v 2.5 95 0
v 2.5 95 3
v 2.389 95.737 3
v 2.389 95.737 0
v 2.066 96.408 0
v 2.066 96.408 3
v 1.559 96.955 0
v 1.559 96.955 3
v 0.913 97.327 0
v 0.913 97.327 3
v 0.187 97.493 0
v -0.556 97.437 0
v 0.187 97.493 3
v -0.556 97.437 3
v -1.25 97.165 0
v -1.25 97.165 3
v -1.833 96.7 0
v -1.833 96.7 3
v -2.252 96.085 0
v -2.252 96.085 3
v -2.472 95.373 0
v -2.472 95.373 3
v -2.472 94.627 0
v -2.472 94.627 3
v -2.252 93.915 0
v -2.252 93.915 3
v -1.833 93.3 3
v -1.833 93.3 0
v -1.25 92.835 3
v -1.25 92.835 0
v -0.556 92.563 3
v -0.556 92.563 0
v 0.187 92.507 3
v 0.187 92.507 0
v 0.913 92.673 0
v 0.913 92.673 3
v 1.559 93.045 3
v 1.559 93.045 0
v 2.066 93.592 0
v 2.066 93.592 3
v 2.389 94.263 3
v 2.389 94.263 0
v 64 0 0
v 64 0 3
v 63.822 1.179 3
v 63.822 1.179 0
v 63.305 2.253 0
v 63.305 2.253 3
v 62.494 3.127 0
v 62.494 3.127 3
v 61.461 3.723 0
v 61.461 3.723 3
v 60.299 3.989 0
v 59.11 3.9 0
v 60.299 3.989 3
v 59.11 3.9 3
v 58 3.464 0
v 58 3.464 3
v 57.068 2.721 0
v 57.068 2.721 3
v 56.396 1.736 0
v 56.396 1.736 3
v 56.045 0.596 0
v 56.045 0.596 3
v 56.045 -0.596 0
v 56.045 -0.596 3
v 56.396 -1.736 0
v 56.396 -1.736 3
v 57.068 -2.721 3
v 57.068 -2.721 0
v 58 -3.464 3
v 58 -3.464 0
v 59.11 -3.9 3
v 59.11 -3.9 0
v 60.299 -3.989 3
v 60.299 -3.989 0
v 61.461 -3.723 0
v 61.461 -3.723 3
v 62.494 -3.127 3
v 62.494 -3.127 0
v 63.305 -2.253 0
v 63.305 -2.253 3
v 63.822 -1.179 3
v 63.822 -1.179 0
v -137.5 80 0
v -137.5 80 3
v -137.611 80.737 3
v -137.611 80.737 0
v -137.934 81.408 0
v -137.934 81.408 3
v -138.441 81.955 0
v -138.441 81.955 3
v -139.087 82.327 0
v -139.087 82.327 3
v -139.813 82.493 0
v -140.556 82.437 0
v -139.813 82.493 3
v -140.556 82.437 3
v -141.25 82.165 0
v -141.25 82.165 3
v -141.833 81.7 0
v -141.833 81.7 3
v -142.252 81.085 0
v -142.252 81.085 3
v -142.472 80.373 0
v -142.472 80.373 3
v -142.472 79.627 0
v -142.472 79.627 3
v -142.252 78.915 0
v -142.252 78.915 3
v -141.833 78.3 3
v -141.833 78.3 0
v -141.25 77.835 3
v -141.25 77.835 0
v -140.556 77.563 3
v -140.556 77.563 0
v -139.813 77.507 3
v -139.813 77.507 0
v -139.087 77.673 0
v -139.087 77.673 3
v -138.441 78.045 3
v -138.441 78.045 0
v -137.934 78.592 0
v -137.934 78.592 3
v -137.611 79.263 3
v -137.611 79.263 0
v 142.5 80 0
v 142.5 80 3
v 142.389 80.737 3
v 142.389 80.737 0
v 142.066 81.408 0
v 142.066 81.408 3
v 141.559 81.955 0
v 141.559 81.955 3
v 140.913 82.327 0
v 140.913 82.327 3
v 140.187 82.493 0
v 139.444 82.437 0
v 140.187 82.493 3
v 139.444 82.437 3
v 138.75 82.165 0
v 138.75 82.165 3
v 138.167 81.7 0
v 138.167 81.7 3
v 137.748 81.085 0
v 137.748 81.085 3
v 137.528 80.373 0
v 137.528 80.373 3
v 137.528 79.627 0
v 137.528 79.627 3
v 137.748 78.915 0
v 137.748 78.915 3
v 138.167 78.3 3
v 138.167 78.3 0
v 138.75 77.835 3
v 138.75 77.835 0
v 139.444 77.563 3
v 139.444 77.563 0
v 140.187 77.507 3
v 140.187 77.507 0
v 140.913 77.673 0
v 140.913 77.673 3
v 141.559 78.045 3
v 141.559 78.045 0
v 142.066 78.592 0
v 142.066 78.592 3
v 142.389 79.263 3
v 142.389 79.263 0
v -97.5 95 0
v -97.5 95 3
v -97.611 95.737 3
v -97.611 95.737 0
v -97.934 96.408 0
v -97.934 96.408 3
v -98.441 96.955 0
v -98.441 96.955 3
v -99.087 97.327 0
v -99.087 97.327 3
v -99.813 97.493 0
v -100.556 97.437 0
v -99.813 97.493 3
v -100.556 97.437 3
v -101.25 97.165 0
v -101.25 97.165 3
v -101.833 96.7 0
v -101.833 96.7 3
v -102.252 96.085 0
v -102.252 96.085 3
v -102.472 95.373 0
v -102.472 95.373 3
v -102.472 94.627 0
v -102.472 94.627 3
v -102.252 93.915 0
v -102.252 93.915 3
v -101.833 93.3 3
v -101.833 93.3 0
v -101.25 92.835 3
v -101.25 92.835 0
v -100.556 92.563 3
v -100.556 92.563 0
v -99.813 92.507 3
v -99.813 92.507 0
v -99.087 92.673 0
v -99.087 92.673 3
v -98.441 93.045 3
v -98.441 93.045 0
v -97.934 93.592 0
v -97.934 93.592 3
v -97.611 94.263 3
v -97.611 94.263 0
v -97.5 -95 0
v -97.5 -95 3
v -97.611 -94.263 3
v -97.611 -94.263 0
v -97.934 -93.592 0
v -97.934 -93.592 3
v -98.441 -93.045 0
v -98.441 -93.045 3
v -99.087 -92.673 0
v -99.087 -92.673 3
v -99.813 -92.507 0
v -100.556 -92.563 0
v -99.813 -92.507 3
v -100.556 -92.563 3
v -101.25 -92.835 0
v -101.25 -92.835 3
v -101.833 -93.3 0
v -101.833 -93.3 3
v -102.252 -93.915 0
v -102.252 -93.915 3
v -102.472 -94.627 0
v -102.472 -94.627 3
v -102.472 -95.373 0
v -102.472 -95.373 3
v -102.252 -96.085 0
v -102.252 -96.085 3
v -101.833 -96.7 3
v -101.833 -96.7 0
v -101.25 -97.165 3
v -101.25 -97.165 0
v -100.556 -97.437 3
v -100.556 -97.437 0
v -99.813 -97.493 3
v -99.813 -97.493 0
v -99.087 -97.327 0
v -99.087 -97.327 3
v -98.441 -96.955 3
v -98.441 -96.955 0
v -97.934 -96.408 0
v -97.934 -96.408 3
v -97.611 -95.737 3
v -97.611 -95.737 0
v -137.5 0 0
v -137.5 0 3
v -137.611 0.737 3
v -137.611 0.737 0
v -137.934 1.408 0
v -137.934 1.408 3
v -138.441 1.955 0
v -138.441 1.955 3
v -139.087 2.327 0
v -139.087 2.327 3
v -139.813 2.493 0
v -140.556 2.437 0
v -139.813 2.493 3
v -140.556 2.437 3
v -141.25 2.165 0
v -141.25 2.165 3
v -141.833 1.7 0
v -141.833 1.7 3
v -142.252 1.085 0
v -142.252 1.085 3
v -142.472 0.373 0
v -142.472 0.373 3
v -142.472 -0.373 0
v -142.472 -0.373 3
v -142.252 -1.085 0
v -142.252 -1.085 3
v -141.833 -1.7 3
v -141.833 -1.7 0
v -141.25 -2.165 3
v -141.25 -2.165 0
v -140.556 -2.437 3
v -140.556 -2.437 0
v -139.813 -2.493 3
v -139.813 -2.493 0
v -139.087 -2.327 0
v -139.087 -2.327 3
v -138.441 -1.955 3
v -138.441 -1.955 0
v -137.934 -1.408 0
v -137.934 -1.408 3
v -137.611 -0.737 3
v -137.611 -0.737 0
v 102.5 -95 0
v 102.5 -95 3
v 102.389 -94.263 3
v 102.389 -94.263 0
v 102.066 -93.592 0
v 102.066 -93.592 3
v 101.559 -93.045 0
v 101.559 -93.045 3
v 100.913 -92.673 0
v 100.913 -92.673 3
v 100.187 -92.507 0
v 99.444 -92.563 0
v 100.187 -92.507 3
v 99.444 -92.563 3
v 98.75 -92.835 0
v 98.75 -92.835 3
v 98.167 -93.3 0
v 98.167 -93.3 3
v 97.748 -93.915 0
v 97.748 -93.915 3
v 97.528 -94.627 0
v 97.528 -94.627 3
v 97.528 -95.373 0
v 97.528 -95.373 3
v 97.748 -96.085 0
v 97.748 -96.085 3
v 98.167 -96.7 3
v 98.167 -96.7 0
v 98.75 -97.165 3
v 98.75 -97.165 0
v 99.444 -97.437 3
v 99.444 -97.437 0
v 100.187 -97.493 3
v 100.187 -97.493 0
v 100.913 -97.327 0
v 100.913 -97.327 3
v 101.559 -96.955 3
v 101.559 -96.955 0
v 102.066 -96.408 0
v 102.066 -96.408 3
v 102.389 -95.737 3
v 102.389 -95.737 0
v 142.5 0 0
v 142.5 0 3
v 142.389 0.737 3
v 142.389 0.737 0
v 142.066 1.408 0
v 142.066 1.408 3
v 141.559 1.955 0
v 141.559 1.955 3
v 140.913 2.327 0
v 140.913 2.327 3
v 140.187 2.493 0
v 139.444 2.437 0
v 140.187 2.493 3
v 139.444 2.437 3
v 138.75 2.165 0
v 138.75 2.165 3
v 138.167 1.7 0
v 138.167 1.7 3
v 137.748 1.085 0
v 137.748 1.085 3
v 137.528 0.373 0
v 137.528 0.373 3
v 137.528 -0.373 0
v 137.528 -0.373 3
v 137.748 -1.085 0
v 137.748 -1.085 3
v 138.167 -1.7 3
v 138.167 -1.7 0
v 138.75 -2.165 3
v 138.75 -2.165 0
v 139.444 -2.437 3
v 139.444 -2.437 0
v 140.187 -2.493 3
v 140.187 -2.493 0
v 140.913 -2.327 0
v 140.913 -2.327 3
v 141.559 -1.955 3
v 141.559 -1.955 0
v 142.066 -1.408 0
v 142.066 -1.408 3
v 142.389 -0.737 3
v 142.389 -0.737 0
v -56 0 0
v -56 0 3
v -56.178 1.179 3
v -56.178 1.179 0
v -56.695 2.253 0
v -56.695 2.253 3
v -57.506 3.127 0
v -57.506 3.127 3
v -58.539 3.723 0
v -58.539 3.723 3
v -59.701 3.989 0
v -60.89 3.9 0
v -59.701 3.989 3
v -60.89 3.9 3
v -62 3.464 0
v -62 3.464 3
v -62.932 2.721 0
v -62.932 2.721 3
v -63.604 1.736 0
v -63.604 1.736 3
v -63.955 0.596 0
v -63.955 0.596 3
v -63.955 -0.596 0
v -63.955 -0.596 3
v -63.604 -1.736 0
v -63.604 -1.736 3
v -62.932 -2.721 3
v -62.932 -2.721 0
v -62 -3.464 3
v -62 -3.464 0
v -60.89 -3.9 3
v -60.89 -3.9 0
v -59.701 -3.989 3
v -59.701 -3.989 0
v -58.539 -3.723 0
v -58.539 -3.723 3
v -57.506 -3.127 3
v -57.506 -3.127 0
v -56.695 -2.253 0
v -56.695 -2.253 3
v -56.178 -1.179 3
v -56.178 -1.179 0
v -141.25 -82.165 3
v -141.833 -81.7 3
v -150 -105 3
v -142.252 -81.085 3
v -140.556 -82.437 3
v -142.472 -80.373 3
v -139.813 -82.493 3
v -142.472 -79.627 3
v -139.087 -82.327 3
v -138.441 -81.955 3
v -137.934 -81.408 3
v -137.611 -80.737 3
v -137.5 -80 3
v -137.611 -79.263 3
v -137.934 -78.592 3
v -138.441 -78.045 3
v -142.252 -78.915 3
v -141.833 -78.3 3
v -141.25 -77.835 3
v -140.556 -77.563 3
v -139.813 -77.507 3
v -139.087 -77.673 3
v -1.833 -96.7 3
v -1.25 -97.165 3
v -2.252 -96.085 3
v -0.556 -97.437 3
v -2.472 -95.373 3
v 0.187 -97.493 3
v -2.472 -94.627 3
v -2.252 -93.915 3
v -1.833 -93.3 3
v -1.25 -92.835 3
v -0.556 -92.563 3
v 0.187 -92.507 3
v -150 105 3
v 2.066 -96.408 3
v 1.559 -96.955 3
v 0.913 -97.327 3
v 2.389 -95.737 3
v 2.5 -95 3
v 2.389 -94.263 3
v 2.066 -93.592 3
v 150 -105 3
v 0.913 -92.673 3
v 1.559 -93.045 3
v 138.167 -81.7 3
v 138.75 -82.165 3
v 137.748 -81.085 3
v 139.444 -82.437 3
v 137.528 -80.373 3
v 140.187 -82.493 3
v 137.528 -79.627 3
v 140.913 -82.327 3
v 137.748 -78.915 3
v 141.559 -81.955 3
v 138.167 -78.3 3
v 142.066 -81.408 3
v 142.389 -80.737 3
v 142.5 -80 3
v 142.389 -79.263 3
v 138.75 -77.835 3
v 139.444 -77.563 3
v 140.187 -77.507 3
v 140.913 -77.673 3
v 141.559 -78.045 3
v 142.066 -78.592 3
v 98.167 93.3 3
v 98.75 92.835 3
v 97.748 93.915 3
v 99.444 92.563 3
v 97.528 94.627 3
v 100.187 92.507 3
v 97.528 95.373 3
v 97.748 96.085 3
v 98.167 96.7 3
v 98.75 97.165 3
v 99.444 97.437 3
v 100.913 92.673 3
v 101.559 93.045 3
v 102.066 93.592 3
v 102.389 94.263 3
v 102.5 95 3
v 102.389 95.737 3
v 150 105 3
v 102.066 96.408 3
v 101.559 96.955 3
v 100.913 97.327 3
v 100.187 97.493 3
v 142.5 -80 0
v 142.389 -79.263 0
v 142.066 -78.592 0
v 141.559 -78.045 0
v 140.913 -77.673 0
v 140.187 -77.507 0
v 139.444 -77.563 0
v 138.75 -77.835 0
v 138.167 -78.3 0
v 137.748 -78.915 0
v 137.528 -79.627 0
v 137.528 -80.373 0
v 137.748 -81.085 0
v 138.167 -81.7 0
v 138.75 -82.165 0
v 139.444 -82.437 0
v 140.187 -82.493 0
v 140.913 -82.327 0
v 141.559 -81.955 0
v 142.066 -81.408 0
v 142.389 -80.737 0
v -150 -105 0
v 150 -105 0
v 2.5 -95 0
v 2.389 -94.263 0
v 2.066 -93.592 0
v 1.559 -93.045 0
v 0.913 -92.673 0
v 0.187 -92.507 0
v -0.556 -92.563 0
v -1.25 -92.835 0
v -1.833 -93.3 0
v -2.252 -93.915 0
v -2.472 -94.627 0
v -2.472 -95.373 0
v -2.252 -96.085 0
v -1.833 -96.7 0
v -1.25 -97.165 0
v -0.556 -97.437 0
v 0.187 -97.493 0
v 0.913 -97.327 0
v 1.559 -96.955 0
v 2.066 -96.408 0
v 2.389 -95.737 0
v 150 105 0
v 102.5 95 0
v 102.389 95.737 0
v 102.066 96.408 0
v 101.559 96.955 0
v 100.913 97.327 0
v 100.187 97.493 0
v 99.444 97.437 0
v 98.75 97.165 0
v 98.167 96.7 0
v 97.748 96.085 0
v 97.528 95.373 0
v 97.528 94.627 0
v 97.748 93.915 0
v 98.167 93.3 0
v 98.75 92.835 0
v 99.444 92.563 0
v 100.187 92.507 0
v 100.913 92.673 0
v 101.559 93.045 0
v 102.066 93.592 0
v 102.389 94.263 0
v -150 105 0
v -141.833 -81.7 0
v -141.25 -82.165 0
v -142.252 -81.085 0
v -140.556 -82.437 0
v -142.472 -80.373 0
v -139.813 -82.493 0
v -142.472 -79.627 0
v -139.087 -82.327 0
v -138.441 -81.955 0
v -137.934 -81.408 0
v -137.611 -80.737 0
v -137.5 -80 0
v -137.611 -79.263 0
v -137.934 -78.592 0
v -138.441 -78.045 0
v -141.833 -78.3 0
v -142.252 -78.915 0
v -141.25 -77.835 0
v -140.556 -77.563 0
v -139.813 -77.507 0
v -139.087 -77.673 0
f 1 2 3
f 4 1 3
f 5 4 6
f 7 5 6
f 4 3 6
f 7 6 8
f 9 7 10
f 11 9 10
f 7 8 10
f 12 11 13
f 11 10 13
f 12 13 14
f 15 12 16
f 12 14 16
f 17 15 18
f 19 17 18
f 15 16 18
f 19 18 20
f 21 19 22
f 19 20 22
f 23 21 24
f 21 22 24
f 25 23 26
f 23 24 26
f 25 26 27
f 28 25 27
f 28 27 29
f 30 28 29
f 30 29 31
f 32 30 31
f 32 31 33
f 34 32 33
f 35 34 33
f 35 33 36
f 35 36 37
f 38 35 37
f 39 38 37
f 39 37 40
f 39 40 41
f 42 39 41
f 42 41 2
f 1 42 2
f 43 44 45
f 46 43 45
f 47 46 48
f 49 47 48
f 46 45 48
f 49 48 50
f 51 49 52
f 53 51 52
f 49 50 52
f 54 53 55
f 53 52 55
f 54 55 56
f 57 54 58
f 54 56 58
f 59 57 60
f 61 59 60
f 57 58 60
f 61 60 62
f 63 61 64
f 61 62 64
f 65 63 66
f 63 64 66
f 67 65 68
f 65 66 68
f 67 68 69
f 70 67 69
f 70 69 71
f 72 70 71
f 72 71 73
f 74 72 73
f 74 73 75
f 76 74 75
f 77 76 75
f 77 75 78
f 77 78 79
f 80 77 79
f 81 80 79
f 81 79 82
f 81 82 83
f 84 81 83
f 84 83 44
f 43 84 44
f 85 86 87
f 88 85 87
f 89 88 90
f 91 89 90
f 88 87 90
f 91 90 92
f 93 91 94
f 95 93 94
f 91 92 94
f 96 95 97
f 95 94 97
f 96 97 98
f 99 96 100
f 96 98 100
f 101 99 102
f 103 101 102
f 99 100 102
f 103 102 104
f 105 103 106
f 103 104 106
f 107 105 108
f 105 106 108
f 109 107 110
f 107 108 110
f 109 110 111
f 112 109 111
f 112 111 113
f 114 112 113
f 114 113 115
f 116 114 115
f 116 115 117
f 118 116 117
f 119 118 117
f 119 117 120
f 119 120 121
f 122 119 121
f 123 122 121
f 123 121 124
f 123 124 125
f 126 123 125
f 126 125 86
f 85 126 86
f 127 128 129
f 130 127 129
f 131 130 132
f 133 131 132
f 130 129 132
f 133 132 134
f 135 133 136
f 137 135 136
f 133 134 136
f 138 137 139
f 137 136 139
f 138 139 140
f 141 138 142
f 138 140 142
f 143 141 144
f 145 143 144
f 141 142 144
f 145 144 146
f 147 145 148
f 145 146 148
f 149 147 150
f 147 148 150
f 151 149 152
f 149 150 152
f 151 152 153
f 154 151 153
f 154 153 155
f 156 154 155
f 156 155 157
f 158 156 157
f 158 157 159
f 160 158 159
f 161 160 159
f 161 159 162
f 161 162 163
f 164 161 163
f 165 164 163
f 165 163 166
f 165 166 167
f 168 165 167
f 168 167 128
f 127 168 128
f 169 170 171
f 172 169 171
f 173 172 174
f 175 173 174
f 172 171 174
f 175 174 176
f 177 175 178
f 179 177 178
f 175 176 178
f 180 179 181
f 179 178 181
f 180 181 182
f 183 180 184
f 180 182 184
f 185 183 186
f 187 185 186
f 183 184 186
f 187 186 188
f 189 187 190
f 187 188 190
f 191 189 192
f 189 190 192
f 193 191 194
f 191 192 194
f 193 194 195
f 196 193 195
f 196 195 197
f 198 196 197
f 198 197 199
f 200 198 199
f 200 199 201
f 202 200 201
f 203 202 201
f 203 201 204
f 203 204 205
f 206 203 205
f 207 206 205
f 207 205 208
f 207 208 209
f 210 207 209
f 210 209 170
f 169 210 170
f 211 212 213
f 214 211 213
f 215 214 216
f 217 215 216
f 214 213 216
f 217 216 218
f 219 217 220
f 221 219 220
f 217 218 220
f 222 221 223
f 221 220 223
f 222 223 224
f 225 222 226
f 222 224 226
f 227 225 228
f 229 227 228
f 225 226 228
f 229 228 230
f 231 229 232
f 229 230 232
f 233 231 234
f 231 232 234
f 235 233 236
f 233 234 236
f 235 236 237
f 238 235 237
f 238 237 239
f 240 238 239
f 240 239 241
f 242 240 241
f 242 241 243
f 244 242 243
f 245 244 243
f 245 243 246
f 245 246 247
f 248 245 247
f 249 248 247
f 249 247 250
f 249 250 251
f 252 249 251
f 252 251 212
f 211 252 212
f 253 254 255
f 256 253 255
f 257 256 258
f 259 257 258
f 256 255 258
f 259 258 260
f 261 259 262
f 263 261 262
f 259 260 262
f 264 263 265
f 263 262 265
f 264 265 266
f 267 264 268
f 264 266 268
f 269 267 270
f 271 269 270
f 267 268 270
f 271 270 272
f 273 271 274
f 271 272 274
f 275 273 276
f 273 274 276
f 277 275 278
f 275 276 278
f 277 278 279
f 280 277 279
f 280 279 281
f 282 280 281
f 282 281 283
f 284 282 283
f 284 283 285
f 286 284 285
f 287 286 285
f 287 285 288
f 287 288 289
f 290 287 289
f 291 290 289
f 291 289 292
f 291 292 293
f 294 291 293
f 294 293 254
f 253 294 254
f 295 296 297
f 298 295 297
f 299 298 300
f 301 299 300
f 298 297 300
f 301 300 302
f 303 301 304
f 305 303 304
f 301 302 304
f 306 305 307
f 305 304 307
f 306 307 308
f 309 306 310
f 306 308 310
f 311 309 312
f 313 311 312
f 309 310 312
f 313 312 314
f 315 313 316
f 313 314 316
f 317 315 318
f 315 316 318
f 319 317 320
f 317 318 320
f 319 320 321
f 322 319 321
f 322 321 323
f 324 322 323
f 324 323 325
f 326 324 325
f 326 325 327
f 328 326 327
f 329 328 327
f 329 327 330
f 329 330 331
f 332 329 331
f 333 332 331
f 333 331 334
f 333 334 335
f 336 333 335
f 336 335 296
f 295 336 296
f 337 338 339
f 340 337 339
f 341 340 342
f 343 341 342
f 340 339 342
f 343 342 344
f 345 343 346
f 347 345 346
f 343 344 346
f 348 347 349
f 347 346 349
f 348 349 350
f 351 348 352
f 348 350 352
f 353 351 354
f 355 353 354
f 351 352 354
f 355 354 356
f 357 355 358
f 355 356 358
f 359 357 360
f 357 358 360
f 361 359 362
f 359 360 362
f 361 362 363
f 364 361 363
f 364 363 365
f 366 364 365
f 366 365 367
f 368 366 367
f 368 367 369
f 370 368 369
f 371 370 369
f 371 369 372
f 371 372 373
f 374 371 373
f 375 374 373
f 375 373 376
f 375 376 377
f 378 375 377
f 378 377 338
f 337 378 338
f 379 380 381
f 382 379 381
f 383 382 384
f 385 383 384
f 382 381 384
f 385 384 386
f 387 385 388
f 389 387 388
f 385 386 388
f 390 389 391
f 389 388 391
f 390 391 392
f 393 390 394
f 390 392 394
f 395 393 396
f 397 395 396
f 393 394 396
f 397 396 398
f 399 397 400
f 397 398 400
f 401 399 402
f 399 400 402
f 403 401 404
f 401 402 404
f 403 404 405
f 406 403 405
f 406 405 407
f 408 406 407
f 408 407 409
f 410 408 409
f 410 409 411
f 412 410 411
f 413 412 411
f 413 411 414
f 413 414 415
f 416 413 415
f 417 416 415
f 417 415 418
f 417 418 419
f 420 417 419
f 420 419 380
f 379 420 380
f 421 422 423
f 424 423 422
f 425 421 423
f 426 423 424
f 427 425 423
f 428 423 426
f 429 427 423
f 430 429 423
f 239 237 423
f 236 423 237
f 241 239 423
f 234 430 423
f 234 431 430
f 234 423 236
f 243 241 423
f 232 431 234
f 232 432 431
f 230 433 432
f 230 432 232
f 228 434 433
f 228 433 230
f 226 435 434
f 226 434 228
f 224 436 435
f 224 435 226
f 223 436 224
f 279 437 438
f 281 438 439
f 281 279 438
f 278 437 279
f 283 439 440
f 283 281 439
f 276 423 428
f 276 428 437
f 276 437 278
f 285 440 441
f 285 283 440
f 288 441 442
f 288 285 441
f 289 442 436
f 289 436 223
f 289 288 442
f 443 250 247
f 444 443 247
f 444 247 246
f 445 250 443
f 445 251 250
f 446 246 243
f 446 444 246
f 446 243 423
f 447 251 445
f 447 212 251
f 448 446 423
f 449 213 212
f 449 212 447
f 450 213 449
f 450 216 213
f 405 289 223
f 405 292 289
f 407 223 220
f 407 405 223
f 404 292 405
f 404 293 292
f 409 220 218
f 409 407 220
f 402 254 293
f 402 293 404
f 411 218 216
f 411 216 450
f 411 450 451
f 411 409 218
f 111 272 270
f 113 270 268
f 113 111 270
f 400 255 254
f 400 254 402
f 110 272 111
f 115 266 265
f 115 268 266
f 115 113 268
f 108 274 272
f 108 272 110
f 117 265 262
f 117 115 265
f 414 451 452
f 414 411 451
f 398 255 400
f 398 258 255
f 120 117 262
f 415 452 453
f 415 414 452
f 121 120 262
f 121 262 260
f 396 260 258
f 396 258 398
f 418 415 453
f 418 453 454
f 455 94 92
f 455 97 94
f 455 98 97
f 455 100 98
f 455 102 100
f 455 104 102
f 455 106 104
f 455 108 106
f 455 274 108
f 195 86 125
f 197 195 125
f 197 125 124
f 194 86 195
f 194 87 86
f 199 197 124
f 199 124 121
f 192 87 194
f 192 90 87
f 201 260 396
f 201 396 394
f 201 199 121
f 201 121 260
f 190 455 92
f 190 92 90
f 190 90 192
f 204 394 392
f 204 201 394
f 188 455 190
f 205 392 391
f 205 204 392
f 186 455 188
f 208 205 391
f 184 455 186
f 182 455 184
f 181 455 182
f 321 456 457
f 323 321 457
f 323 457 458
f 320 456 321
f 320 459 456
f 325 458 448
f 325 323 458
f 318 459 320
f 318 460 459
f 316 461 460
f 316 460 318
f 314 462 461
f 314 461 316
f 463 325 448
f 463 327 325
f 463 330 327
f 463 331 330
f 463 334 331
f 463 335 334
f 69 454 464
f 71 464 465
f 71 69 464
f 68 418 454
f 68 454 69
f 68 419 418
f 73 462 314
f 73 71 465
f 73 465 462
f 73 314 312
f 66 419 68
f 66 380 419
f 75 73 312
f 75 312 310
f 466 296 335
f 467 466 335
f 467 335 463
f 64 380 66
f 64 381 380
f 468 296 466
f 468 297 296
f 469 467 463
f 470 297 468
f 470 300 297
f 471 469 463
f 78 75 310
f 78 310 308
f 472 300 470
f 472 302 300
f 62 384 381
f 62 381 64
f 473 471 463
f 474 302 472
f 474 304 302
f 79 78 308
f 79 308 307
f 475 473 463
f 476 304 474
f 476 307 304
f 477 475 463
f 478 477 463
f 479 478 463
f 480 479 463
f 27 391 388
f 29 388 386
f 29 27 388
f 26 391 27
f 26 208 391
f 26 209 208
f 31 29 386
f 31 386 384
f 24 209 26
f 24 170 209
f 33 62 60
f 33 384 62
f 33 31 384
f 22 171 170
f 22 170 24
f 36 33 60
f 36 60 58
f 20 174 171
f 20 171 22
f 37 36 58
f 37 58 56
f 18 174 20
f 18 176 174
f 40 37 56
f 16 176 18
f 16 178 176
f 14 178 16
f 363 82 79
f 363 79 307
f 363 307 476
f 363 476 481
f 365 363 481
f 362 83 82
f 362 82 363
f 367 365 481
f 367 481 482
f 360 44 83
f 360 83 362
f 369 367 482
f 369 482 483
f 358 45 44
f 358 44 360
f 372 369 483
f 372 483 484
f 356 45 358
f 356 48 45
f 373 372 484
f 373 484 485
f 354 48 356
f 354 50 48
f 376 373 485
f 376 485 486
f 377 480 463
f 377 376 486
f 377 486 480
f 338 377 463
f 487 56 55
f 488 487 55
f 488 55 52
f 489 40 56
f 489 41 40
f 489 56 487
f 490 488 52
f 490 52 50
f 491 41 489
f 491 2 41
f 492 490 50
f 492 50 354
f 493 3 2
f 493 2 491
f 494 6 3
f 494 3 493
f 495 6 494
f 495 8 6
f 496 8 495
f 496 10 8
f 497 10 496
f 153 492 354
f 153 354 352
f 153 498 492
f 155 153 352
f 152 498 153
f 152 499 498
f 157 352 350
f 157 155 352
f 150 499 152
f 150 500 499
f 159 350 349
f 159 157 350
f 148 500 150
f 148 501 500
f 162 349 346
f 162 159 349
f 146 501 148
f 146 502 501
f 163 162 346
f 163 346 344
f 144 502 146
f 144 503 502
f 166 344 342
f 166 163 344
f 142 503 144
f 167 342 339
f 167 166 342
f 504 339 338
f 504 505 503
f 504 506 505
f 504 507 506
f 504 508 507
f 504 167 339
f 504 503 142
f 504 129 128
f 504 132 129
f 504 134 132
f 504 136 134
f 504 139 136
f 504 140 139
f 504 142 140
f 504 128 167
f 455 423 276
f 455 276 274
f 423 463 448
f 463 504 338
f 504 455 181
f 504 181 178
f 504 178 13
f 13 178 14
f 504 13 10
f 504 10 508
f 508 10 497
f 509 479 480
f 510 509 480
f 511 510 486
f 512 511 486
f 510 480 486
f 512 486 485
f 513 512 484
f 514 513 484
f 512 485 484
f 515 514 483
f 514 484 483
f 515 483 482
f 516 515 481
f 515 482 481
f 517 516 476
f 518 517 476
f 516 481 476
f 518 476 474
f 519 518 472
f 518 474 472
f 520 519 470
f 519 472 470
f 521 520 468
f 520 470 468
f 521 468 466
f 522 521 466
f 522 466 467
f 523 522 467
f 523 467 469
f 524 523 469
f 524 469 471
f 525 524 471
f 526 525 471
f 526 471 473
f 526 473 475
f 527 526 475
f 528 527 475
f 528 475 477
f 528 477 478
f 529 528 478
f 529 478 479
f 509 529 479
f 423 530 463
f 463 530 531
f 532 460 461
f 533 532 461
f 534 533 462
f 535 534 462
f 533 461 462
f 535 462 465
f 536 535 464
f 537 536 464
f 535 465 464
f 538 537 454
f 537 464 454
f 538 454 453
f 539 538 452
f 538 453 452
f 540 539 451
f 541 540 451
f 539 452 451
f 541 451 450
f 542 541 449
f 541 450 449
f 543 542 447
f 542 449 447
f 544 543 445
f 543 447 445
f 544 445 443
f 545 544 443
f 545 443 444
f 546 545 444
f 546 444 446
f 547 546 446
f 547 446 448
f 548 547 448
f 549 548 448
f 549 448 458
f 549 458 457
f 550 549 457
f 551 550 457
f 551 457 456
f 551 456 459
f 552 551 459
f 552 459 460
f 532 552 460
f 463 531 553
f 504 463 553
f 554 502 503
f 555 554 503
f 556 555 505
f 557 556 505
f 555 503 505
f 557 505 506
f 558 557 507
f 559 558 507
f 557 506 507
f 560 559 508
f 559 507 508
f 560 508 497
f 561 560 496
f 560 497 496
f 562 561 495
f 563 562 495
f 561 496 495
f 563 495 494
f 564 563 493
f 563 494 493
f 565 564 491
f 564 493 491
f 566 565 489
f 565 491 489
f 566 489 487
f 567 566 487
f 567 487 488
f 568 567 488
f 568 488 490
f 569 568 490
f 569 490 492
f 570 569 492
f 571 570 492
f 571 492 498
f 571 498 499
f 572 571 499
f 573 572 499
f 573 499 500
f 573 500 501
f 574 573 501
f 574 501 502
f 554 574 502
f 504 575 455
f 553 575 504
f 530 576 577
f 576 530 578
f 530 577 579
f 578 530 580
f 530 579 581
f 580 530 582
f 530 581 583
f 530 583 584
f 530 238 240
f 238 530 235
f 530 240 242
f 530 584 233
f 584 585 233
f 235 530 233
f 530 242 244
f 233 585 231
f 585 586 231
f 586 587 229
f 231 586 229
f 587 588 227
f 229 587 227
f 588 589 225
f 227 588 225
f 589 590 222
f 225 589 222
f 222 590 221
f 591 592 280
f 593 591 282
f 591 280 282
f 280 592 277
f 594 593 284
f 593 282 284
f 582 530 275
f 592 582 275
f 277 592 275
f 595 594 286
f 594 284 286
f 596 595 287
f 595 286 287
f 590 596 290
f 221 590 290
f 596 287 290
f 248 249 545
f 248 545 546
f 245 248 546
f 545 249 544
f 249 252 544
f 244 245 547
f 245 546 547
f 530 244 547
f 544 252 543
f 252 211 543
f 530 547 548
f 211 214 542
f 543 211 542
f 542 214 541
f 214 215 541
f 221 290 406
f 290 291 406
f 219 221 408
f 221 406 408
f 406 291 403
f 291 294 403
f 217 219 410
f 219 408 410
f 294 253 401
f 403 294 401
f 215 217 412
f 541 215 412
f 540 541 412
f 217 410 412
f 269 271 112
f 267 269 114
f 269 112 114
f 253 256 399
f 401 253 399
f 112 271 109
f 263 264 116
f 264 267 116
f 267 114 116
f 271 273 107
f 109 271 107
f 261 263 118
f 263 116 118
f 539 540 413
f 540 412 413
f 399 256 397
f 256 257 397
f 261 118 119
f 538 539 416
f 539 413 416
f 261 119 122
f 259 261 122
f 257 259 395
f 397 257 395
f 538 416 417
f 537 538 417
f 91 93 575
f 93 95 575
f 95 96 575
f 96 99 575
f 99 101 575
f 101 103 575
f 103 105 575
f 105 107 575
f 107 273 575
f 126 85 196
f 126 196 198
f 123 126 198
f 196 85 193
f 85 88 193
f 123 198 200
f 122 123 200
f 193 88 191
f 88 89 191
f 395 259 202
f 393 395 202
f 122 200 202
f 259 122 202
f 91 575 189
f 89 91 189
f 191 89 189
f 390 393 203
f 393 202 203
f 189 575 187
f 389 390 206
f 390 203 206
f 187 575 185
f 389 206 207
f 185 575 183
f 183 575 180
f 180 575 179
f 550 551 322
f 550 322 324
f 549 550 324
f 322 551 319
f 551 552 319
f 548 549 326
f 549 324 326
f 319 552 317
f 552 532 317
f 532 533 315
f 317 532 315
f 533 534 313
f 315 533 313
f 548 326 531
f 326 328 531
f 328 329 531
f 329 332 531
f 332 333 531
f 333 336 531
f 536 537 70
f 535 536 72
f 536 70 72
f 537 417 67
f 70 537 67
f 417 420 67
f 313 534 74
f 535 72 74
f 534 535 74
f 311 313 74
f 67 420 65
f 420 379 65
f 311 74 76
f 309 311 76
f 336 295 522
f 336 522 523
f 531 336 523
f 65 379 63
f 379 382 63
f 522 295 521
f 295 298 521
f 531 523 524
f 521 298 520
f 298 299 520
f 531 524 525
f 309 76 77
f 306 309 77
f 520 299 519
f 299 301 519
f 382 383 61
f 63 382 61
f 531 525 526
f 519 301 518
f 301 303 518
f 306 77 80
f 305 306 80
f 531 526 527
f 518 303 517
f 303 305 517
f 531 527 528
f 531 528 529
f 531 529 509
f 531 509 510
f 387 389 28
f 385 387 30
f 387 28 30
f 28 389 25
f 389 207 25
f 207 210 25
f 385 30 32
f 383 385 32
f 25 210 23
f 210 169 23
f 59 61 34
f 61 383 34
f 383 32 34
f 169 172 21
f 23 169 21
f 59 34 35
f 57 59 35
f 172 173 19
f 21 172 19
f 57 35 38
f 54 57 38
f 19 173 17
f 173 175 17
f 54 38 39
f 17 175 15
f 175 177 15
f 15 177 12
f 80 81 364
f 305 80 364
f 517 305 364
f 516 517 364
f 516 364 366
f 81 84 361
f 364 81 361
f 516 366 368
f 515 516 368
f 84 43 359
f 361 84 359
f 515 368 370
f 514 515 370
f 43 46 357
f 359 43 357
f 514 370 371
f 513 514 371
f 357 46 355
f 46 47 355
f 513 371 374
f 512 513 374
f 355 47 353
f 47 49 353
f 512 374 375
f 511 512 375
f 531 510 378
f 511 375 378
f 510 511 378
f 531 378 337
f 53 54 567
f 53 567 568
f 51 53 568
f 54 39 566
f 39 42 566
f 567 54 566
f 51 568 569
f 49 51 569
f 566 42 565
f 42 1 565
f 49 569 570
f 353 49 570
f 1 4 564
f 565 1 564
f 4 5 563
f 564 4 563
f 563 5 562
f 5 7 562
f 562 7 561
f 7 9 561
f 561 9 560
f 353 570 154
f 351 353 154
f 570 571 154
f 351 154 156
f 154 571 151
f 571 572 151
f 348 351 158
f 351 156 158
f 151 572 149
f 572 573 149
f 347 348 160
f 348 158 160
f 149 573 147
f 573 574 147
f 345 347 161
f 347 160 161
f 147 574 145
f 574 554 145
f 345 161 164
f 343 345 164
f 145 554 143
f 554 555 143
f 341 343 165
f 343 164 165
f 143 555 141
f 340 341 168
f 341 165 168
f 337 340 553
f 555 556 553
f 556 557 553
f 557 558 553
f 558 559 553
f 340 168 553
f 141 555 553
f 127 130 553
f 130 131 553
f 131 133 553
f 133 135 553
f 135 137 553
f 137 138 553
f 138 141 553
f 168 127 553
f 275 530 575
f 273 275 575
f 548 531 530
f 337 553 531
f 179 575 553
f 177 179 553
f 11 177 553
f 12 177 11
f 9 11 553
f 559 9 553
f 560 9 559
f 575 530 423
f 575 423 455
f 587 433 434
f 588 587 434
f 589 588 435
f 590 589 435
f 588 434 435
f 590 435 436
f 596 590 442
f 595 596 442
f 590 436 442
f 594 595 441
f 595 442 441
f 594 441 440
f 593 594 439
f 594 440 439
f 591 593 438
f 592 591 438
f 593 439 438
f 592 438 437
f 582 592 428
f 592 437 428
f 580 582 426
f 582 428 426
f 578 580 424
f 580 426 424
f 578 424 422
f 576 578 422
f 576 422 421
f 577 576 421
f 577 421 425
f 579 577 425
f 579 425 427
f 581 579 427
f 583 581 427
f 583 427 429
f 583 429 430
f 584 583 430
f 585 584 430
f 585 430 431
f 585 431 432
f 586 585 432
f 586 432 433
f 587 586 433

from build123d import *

# Parameters (mm, degrees)
CROQUIS1_W              = 300
CROQUIS1_H              = 210
SALIENTE_EXTRUIR1_DEPTH = 3
CROQUIS3_R              = 2.5
CORTAR_EXTRUIR1_DEPTH   = 4
CROQUIS4_R              = 4
CORTAR_EXTRUIR2_DEPTH   = 4


with BuildPart() as part:
    # Croquis1 → Saliente-Extruir1 (new body)
    with BuildSketch(Plane.XY):
        Rectangle(CROQUIS1_W, CROQUIS1_H)
    extrude(amount=SALIENTE_EXTRUIR1_DEPTH)

    # Croquis3 → Cortar-Extruir1 (cut, through all)
    with BuildSketch(Plane.XY.offset(3)):
        with Locations((0, 95)):
            Circle(CROQUIS3_R)
        with Locations((-140, 0)):
            Circle(CROQUIS3_R)
        with Locations((100, 95)):
            Circle(CROQUIS3_R)
        with Locations((-100, 95)):
            Circle(CROQUIS3_R)
        with Locations((-140, 80)):
            Circle(CROQUIS3_R)
        with Locations((-140, -80)):
            Circle(CROQUIS3_R)
        with Locations((100, -95)):
            Circle(CROQUIS3_R)
        with Locations((-100, -95)):
            Circle(CROQUIS3_R)
        with Locations((0, -95)):
            Circle(CROQUIS3_R)
        with Locations((140, -80)):
            Circle(CROQUIS3_R)
        with Locations((140, 80)):
            Circle(CROQUIS3_R)
        with Locations((140, 0)):
            Circle(CROQUIS3_R)
    extrude(amount=-CORTAR_EXTRUIR1_DEPTH, mode=Mode.SUBTRACT)

    # Croquis4 → Cortar-Extruir2 (cut, through all)
    with BuildSketch(Plane.XY.offset(3)):
        with Locations((-60, 0)):
            Circle(CROQUIS4_R)
        with Locations((60, 0)):
            Circle(CROQUIS4_R)
    extrude(amount=-CORTAR_EXTRUIR2_DEPTH, mode=Mode.SUBTRACT)


solid = part.part
